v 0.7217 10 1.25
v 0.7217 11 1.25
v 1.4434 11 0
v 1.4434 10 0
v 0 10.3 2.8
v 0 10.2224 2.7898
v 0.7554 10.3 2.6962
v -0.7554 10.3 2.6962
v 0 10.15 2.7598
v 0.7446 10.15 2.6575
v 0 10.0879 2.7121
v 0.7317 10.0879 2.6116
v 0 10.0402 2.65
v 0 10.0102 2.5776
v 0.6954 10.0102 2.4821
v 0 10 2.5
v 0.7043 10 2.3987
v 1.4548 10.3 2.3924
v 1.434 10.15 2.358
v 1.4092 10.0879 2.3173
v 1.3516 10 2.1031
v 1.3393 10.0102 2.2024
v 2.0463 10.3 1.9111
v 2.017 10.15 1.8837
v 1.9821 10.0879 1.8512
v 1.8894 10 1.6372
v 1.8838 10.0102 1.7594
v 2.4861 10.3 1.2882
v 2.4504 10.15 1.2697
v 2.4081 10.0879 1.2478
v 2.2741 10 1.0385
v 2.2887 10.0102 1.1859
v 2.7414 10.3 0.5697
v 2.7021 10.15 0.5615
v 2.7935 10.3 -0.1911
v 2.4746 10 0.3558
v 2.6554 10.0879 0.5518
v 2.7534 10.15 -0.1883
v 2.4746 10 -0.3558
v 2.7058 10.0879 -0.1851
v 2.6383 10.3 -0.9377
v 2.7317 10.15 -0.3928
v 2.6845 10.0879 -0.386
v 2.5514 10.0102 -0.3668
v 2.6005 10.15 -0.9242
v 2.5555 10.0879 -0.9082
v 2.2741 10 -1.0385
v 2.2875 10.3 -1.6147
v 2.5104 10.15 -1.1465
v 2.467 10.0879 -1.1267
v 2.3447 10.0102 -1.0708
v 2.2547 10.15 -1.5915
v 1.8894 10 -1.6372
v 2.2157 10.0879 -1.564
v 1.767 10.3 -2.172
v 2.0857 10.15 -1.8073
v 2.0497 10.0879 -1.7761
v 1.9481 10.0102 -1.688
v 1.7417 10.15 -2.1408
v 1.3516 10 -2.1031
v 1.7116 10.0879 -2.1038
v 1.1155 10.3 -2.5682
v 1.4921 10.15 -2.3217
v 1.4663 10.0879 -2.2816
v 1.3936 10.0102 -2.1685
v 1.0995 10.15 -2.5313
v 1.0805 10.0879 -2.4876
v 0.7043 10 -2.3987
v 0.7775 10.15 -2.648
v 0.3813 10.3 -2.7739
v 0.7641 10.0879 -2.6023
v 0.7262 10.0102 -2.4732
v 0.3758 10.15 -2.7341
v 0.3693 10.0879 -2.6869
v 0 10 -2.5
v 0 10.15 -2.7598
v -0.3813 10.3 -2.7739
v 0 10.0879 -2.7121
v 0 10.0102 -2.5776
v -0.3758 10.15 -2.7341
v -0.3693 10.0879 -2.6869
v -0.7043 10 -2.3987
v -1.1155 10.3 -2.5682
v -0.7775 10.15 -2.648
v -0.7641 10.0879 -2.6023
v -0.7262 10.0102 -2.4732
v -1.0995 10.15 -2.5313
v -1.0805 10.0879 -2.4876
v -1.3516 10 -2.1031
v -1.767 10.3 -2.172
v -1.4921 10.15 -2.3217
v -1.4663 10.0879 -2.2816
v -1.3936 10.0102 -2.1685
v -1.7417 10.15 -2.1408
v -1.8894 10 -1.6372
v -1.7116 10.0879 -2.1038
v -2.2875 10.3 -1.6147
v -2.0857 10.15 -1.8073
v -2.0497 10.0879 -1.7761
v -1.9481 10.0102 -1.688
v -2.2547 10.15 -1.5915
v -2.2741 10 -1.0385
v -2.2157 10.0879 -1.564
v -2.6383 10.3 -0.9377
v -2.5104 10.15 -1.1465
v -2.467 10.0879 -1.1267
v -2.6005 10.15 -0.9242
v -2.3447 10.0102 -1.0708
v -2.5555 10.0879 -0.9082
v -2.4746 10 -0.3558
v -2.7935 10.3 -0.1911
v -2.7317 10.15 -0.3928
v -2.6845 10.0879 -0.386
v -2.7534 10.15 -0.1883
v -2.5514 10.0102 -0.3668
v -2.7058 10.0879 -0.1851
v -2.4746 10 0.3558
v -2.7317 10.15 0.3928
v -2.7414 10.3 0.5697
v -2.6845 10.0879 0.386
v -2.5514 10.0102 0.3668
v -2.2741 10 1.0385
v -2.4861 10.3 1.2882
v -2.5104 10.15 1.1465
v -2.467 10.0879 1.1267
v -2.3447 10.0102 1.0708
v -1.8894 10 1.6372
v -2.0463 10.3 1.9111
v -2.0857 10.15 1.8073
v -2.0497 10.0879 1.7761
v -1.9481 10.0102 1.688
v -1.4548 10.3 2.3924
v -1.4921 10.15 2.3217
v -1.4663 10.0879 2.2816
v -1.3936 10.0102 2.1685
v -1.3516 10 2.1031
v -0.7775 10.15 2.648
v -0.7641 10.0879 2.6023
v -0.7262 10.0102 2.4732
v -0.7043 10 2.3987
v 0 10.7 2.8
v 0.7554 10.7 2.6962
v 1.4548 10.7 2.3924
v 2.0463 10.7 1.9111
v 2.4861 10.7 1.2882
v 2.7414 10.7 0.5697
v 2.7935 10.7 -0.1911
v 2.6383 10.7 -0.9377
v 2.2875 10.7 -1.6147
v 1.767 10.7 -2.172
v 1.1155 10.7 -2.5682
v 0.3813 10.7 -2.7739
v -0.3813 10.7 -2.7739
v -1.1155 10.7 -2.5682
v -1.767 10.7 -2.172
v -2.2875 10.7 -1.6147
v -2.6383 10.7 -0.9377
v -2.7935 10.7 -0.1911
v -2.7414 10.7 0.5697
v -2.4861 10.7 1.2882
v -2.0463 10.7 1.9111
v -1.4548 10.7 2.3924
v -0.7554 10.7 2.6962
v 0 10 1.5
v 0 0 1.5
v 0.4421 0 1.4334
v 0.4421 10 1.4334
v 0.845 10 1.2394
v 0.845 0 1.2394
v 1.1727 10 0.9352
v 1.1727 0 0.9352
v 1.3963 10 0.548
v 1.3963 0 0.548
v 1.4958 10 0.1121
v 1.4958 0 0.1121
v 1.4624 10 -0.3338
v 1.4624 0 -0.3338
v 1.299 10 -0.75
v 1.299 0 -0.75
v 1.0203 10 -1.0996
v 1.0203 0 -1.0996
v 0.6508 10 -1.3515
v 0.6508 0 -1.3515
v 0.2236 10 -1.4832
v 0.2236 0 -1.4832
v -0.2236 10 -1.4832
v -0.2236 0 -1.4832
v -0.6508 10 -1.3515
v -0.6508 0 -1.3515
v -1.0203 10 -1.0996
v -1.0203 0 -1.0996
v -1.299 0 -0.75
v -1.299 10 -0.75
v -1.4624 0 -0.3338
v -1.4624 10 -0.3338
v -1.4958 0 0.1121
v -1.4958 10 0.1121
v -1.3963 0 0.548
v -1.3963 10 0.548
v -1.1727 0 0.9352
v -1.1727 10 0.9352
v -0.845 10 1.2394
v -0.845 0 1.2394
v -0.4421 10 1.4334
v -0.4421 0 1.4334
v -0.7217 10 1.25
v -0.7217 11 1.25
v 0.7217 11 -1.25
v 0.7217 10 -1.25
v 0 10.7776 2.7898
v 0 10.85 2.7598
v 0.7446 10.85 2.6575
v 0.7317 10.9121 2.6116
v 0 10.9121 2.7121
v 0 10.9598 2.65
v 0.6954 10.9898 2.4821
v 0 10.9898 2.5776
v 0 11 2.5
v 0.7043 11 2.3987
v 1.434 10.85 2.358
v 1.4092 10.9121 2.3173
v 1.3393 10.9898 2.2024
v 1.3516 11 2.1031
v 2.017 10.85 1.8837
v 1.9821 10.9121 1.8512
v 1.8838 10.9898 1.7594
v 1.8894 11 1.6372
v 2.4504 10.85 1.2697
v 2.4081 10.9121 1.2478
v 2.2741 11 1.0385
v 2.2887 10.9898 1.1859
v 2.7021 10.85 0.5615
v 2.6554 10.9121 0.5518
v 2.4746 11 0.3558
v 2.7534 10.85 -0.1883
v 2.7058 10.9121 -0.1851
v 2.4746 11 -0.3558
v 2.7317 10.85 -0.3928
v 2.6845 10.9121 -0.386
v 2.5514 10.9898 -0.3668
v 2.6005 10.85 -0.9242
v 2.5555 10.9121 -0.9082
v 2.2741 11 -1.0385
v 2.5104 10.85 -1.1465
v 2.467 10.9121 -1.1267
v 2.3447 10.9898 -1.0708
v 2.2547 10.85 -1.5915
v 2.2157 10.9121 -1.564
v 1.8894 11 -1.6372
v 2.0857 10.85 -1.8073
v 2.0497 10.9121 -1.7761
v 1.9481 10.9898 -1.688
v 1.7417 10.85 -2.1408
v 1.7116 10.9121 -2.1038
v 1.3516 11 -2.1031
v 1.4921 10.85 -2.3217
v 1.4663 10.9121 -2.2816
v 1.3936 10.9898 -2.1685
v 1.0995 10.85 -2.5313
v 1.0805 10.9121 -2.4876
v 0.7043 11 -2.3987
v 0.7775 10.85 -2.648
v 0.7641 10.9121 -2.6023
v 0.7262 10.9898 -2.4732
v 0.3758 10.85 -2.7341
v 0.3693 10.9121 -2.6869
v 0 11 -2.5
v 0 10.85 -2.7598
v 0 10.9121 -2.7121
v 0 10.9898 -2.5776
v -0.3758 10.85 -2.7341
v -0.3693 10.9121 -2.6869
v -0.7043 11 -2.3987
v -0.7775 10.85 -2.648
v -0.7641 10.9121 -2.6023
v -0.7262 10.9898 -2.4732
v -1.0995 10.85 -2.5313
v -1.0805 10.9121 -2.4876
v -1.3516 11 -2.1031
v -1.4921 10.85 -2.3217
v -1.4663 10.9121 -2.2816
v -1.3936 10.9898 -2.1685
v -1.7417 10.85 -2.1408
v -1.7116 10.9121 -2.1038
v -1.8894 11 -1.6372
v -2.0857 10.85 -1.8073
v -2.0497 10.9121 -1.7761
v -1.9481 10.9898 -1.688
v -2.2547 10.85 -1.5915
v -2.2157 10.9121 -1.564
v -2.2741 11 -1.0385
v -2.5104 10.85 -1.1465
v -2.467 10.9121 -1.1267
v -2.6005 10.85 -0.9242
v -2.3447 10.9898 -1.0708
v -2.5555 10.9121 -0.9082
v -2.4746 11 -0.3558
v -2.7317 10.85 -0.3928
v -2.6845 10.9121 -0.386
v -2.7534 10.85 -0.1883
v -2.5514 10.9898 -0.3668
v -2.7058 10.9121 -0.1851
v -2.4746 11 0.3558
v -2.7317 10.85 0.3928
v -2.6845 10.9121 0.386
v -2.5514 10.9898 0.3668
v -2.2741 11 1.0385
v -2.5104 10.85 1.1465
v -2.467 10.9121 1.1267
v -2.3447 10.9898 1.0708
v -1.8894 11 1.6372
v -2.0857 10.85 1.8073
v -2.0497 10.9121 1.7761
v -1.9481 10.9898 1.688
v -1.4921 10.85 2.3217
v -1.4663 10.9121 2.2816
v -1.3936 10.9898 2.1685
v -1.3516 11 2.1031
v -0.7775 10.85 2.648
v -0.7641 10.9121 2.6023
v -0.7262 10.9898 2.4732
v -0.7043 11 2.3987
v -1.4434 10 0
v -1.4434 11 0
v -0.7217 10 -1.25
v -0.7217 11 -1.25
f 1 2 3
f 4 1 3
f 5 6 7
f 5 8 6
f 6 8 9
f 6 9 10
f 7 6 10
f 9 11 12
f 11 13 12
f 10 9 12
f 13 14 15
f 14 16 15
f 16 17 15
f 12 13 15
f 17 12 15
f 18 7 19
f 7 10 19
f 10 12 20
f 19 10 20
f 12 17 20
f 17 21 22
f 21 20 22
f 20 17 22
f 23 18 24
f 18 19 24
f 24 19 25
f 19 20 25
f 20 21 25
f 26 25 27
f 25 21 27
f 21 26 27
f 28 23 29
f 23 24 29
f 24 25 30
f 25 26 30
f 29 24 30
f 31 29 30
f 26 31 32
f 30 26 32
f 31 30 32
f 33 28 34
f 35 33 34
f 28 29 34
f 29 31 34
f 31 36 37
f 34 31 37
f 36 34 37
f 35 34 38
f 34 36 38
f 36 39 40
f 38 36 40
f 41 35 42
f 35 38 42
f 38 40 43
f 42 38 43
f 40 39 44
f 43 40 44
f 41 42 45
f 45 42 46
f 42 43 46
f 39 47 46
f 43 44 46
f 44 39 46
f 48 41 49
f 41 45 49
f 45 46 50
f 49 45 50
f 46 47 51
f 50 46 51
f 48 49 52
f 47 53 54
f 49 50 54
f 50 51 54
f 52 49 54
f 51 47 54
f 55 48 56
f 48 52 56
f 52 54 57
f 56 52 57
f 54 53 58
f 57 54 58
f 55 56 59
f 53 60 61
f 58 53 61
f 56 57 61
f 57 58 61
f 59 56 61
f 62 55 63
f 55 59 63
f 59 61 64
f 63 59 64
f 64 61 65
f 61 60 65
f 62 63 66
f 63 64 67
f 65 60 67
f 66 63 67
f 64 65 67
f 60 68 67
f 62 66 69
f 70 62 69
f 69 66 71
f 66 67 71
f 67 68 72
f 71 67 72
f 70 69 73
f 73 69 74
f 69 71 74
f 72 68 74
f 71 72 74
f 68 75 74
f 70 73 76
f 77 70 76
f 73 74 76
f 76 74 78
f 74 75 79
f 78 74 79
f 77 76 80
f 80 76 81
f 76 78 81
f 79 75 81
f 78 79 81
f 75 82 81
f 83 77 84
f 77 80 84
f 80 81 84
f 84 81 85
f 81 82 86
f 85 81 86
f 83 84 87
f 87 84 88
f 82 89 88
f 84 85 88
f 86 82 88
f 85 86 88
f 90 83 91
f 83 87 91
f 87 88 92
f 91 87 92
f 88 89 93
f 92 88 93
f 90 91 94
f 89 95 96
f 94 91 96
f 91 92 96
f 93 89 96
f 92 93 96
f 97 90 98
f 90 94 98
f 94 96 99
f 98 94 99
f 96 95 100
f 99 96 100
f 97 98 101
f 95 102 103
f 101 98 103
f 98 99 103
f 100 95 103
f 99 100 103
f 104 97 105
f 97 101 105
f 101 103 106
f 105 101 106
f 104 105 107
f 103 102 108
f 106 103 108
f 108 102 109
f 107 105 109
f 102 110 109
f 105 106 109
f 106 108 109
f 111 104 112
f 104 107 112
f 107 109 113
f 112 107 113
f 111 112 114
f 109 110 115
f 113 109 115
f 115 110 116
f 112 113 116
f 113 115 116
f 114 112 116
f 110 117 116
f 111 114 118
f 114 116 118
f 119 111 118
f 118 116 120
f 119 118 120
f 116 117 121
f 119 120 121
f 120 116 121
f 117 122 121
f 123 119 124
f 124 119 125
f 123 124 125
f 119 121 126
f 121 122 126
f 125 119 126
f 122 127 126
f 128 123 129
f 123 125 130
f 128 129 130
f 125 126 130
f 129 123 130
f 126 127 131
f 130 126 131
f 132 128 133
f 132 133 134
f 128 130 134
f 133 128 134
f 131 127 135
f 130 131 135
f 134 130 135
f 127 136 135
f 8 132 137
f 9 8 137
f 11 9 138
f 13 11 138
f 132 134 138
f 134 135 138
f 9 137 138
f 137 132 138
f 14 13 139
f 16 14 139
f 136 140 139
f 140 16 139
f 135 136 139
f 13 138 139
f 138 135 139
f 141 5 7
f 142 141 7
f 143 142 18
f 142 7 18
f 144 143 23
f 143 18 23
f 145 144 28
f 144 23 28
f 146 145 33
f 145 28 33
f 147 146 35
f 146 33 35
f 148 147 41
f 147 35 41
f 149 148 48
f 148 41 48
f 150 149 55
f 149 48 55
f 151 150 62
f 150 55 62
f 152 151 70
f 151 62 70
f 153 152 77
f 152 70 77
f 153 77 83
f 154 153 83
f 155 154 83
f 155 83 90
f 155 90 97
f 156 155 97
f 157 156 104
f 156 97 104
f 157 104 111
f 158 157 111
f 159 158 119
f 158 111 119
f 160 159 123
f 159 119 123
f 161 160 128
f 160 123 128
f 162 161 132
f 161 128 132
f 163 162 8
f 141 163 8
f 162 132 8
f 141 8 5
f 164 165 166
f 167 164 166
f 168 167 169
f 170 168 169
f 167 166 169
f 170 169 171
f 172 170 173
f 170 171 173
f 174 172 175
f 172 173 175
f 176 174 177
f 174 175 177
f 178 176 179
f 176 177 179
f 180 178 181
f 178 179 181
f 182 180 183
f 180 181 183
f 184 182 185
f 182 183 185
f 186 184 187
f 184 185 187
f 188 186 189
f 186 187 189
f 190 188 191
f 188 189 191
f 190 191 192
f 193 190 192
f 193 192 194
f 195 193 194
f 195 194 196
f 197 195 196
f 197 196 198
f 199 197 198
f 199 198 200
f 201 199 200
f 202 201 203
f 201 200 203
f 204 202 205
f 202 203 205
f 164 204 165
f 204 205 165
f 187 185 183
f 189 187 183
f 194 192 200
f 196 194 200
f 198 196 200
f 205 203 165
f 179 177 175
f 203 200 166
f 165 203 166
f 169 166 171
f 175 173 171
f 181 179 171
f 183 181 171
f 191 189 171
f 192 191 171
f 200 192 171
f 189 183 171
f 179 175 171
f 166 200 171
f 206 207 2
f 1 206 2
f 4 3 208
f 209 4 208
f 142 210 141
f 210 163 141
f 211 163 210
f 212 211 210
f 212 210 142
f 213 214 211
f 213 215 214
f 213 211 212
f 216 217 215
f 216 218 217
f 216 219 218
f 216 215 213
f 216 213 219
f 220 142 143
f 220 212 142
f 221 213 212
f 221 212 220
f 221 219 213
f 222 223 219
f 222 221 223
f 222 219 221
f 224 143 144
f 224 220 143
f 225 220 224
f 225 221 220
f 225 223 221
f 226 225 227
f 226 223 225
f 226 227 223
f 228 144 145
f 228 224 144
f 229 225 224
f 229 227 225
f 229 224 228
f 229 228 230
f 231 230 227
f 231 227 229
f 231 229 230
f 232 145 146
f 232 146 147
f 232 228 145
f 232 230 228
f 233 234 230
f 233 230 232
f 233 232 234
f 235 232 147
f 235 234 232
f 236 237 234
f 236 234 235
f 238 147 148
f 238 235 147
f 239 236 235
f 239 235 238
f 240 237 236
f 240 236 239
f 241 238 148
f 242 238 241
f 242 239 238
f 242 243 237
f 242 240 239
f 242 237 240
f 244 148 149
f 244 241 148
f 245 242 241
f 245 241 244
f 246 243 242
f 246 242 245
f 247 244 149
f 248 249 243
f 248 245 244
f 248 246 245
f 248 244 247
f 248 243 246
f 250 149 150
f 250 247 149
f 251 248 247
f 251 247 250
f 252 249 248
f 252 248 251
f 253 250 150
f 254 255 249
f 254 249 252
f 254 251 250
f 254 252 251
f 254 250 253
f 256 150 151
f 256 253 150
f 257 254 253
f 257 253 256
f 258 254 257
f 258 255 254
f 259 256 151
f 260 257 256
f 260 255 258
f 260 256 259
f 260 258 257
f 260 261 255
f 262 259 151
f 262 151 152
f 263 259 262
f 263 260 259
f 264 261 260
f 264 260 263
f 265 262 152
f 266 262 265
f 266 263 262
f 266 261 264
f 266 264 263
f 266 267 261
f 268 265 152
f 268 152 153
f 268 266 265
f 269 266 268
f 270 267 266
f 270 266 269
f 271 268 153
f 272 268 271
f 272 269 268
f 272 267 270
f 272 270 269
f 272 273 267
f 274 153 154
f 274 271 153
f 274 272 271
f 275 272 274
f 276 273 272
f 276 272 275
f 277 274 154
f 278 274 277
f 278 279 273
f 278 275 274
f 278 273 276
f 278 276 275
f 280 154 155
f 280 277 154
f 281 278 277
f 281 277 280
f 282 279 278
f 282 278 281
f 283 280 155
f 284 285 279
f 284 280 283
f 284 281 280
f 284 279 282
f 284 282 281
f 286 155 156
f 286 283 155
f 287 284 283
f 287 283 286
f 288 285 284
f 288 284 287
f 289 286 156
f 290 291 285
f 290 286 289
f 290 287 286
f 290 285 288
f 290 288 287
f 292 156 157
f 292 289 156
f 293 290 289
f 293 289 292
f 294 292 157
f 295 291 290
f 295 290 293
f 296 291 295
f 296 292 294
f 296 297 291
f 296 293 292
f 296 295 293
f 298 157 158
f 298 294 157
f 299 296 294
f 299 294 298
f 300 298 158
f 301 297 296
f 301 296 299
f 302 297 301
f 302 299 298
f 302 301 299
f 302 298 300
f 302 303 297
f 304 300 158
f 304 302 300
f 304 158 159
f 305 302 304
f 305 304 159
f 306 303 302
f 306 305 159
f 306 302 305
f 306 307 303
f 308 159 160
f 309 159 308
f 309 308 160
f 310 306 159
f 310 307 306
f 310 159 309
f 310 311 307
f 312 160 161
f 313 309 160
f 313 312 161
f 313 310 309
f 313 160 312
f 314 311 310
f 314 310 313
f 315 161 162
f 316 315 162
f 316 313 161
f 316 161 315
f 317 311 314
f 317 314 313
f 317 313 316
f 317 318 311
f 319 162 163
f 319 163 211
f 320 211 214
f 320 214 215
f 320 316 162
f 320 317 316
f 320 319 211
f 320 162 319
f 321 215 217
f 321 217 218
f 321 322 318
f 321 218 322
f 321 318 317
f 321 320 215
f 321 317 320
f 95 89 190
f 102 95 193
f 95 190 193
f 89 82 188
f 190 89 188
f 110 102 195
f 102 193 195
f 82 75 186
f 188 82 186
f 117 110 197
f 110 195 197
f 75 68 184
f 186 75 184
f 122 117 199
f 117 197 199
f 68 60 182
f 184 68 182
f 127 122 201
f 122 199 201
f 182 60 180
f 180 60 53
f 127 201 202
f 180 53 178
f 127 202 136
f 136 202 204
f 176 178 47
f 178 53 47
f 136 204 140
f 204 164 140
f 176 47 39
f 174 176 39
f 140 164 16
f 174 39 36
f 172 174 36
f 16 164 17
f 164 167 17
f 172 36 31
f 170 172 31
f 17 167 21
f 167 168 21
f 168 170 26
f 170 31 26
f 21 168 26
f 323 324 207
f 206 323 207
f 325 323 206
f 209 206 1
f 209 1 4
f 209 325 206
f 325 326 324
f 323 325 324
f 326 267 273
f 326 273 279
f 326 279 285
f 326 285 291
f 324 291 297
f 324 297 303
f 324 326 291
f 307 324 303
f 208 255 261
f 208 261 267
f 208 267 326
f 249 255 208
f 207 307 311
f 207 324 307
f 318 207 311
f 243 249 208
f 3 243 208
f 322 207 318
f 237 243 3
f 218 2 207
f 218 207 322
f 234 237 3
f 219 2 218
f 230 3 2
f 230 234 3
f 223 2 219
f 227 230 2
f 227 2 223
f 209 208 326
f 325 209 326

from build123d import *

# Parameters (mm, degrees)
SKETCH_1_R          = 1.5
EXTRUDE_1_DEPTH     = 10
SKETCH_2_R          = 2.8
EXTRUDE_2_DEPTH     = 1
CUT_EXTRUDE_1_DEPTH = 1
FILLET_1_R          = 0.3


with BuildPart() as part:
    # 草图1 → 凸台-拉伸1 (new body)
    with BuildSketch(Plane(origin=(0, 0, 0), x_dir=(1, 0, 0), z_dir=(0, 1, 0))):
        with Locations(Location((0, 0, 0), (0, 0, 270))):
            Circle(SKETCH_1_R)
    extrude(amount=EXTRUDE_1_DEPTH)

    # 草图2 → 凸台-拉伸2 (add)
    with BuildSketch(Plane(origin=(0, 10, 0), x_dir=(1, 0, 0), z_dir=(0, 1, 0))):
        with Locations(Location((0, 0, 0), (0, 0, 270))):
            Circle(SKETCH_2_R)
    extrude(amount=EXTRUDE_2_DEPTH)

    # 草图3 → 切除-拉伸1 (cut)
    with BuildSketch(Plane(origin=(0, 11, 0), x_dir=(1, 0, 0), z_dir=(0, 1, 0))):
        Polygon((-1.443375673, 0), (-0.721687836, -1.25), (0.721687836, -1.25), (1.443375673, 0), (0.721687836, 1.25), (-0.721687836, 1.25), align=None)
    extrude(amount=-CUT_EXTRUDE_1_DEPTH, mode=Mode.SUBTRACT)

    # 圆角1
    fillet_1_edges = [part.edges().sort_by_distance(p)[0] for p in [
        (0, 10, -2.8),
        (0, 11, -2.8),
    ]]
    fillet(fillet_1_edges, radius=FILLET_1_R)


solid = part.part
